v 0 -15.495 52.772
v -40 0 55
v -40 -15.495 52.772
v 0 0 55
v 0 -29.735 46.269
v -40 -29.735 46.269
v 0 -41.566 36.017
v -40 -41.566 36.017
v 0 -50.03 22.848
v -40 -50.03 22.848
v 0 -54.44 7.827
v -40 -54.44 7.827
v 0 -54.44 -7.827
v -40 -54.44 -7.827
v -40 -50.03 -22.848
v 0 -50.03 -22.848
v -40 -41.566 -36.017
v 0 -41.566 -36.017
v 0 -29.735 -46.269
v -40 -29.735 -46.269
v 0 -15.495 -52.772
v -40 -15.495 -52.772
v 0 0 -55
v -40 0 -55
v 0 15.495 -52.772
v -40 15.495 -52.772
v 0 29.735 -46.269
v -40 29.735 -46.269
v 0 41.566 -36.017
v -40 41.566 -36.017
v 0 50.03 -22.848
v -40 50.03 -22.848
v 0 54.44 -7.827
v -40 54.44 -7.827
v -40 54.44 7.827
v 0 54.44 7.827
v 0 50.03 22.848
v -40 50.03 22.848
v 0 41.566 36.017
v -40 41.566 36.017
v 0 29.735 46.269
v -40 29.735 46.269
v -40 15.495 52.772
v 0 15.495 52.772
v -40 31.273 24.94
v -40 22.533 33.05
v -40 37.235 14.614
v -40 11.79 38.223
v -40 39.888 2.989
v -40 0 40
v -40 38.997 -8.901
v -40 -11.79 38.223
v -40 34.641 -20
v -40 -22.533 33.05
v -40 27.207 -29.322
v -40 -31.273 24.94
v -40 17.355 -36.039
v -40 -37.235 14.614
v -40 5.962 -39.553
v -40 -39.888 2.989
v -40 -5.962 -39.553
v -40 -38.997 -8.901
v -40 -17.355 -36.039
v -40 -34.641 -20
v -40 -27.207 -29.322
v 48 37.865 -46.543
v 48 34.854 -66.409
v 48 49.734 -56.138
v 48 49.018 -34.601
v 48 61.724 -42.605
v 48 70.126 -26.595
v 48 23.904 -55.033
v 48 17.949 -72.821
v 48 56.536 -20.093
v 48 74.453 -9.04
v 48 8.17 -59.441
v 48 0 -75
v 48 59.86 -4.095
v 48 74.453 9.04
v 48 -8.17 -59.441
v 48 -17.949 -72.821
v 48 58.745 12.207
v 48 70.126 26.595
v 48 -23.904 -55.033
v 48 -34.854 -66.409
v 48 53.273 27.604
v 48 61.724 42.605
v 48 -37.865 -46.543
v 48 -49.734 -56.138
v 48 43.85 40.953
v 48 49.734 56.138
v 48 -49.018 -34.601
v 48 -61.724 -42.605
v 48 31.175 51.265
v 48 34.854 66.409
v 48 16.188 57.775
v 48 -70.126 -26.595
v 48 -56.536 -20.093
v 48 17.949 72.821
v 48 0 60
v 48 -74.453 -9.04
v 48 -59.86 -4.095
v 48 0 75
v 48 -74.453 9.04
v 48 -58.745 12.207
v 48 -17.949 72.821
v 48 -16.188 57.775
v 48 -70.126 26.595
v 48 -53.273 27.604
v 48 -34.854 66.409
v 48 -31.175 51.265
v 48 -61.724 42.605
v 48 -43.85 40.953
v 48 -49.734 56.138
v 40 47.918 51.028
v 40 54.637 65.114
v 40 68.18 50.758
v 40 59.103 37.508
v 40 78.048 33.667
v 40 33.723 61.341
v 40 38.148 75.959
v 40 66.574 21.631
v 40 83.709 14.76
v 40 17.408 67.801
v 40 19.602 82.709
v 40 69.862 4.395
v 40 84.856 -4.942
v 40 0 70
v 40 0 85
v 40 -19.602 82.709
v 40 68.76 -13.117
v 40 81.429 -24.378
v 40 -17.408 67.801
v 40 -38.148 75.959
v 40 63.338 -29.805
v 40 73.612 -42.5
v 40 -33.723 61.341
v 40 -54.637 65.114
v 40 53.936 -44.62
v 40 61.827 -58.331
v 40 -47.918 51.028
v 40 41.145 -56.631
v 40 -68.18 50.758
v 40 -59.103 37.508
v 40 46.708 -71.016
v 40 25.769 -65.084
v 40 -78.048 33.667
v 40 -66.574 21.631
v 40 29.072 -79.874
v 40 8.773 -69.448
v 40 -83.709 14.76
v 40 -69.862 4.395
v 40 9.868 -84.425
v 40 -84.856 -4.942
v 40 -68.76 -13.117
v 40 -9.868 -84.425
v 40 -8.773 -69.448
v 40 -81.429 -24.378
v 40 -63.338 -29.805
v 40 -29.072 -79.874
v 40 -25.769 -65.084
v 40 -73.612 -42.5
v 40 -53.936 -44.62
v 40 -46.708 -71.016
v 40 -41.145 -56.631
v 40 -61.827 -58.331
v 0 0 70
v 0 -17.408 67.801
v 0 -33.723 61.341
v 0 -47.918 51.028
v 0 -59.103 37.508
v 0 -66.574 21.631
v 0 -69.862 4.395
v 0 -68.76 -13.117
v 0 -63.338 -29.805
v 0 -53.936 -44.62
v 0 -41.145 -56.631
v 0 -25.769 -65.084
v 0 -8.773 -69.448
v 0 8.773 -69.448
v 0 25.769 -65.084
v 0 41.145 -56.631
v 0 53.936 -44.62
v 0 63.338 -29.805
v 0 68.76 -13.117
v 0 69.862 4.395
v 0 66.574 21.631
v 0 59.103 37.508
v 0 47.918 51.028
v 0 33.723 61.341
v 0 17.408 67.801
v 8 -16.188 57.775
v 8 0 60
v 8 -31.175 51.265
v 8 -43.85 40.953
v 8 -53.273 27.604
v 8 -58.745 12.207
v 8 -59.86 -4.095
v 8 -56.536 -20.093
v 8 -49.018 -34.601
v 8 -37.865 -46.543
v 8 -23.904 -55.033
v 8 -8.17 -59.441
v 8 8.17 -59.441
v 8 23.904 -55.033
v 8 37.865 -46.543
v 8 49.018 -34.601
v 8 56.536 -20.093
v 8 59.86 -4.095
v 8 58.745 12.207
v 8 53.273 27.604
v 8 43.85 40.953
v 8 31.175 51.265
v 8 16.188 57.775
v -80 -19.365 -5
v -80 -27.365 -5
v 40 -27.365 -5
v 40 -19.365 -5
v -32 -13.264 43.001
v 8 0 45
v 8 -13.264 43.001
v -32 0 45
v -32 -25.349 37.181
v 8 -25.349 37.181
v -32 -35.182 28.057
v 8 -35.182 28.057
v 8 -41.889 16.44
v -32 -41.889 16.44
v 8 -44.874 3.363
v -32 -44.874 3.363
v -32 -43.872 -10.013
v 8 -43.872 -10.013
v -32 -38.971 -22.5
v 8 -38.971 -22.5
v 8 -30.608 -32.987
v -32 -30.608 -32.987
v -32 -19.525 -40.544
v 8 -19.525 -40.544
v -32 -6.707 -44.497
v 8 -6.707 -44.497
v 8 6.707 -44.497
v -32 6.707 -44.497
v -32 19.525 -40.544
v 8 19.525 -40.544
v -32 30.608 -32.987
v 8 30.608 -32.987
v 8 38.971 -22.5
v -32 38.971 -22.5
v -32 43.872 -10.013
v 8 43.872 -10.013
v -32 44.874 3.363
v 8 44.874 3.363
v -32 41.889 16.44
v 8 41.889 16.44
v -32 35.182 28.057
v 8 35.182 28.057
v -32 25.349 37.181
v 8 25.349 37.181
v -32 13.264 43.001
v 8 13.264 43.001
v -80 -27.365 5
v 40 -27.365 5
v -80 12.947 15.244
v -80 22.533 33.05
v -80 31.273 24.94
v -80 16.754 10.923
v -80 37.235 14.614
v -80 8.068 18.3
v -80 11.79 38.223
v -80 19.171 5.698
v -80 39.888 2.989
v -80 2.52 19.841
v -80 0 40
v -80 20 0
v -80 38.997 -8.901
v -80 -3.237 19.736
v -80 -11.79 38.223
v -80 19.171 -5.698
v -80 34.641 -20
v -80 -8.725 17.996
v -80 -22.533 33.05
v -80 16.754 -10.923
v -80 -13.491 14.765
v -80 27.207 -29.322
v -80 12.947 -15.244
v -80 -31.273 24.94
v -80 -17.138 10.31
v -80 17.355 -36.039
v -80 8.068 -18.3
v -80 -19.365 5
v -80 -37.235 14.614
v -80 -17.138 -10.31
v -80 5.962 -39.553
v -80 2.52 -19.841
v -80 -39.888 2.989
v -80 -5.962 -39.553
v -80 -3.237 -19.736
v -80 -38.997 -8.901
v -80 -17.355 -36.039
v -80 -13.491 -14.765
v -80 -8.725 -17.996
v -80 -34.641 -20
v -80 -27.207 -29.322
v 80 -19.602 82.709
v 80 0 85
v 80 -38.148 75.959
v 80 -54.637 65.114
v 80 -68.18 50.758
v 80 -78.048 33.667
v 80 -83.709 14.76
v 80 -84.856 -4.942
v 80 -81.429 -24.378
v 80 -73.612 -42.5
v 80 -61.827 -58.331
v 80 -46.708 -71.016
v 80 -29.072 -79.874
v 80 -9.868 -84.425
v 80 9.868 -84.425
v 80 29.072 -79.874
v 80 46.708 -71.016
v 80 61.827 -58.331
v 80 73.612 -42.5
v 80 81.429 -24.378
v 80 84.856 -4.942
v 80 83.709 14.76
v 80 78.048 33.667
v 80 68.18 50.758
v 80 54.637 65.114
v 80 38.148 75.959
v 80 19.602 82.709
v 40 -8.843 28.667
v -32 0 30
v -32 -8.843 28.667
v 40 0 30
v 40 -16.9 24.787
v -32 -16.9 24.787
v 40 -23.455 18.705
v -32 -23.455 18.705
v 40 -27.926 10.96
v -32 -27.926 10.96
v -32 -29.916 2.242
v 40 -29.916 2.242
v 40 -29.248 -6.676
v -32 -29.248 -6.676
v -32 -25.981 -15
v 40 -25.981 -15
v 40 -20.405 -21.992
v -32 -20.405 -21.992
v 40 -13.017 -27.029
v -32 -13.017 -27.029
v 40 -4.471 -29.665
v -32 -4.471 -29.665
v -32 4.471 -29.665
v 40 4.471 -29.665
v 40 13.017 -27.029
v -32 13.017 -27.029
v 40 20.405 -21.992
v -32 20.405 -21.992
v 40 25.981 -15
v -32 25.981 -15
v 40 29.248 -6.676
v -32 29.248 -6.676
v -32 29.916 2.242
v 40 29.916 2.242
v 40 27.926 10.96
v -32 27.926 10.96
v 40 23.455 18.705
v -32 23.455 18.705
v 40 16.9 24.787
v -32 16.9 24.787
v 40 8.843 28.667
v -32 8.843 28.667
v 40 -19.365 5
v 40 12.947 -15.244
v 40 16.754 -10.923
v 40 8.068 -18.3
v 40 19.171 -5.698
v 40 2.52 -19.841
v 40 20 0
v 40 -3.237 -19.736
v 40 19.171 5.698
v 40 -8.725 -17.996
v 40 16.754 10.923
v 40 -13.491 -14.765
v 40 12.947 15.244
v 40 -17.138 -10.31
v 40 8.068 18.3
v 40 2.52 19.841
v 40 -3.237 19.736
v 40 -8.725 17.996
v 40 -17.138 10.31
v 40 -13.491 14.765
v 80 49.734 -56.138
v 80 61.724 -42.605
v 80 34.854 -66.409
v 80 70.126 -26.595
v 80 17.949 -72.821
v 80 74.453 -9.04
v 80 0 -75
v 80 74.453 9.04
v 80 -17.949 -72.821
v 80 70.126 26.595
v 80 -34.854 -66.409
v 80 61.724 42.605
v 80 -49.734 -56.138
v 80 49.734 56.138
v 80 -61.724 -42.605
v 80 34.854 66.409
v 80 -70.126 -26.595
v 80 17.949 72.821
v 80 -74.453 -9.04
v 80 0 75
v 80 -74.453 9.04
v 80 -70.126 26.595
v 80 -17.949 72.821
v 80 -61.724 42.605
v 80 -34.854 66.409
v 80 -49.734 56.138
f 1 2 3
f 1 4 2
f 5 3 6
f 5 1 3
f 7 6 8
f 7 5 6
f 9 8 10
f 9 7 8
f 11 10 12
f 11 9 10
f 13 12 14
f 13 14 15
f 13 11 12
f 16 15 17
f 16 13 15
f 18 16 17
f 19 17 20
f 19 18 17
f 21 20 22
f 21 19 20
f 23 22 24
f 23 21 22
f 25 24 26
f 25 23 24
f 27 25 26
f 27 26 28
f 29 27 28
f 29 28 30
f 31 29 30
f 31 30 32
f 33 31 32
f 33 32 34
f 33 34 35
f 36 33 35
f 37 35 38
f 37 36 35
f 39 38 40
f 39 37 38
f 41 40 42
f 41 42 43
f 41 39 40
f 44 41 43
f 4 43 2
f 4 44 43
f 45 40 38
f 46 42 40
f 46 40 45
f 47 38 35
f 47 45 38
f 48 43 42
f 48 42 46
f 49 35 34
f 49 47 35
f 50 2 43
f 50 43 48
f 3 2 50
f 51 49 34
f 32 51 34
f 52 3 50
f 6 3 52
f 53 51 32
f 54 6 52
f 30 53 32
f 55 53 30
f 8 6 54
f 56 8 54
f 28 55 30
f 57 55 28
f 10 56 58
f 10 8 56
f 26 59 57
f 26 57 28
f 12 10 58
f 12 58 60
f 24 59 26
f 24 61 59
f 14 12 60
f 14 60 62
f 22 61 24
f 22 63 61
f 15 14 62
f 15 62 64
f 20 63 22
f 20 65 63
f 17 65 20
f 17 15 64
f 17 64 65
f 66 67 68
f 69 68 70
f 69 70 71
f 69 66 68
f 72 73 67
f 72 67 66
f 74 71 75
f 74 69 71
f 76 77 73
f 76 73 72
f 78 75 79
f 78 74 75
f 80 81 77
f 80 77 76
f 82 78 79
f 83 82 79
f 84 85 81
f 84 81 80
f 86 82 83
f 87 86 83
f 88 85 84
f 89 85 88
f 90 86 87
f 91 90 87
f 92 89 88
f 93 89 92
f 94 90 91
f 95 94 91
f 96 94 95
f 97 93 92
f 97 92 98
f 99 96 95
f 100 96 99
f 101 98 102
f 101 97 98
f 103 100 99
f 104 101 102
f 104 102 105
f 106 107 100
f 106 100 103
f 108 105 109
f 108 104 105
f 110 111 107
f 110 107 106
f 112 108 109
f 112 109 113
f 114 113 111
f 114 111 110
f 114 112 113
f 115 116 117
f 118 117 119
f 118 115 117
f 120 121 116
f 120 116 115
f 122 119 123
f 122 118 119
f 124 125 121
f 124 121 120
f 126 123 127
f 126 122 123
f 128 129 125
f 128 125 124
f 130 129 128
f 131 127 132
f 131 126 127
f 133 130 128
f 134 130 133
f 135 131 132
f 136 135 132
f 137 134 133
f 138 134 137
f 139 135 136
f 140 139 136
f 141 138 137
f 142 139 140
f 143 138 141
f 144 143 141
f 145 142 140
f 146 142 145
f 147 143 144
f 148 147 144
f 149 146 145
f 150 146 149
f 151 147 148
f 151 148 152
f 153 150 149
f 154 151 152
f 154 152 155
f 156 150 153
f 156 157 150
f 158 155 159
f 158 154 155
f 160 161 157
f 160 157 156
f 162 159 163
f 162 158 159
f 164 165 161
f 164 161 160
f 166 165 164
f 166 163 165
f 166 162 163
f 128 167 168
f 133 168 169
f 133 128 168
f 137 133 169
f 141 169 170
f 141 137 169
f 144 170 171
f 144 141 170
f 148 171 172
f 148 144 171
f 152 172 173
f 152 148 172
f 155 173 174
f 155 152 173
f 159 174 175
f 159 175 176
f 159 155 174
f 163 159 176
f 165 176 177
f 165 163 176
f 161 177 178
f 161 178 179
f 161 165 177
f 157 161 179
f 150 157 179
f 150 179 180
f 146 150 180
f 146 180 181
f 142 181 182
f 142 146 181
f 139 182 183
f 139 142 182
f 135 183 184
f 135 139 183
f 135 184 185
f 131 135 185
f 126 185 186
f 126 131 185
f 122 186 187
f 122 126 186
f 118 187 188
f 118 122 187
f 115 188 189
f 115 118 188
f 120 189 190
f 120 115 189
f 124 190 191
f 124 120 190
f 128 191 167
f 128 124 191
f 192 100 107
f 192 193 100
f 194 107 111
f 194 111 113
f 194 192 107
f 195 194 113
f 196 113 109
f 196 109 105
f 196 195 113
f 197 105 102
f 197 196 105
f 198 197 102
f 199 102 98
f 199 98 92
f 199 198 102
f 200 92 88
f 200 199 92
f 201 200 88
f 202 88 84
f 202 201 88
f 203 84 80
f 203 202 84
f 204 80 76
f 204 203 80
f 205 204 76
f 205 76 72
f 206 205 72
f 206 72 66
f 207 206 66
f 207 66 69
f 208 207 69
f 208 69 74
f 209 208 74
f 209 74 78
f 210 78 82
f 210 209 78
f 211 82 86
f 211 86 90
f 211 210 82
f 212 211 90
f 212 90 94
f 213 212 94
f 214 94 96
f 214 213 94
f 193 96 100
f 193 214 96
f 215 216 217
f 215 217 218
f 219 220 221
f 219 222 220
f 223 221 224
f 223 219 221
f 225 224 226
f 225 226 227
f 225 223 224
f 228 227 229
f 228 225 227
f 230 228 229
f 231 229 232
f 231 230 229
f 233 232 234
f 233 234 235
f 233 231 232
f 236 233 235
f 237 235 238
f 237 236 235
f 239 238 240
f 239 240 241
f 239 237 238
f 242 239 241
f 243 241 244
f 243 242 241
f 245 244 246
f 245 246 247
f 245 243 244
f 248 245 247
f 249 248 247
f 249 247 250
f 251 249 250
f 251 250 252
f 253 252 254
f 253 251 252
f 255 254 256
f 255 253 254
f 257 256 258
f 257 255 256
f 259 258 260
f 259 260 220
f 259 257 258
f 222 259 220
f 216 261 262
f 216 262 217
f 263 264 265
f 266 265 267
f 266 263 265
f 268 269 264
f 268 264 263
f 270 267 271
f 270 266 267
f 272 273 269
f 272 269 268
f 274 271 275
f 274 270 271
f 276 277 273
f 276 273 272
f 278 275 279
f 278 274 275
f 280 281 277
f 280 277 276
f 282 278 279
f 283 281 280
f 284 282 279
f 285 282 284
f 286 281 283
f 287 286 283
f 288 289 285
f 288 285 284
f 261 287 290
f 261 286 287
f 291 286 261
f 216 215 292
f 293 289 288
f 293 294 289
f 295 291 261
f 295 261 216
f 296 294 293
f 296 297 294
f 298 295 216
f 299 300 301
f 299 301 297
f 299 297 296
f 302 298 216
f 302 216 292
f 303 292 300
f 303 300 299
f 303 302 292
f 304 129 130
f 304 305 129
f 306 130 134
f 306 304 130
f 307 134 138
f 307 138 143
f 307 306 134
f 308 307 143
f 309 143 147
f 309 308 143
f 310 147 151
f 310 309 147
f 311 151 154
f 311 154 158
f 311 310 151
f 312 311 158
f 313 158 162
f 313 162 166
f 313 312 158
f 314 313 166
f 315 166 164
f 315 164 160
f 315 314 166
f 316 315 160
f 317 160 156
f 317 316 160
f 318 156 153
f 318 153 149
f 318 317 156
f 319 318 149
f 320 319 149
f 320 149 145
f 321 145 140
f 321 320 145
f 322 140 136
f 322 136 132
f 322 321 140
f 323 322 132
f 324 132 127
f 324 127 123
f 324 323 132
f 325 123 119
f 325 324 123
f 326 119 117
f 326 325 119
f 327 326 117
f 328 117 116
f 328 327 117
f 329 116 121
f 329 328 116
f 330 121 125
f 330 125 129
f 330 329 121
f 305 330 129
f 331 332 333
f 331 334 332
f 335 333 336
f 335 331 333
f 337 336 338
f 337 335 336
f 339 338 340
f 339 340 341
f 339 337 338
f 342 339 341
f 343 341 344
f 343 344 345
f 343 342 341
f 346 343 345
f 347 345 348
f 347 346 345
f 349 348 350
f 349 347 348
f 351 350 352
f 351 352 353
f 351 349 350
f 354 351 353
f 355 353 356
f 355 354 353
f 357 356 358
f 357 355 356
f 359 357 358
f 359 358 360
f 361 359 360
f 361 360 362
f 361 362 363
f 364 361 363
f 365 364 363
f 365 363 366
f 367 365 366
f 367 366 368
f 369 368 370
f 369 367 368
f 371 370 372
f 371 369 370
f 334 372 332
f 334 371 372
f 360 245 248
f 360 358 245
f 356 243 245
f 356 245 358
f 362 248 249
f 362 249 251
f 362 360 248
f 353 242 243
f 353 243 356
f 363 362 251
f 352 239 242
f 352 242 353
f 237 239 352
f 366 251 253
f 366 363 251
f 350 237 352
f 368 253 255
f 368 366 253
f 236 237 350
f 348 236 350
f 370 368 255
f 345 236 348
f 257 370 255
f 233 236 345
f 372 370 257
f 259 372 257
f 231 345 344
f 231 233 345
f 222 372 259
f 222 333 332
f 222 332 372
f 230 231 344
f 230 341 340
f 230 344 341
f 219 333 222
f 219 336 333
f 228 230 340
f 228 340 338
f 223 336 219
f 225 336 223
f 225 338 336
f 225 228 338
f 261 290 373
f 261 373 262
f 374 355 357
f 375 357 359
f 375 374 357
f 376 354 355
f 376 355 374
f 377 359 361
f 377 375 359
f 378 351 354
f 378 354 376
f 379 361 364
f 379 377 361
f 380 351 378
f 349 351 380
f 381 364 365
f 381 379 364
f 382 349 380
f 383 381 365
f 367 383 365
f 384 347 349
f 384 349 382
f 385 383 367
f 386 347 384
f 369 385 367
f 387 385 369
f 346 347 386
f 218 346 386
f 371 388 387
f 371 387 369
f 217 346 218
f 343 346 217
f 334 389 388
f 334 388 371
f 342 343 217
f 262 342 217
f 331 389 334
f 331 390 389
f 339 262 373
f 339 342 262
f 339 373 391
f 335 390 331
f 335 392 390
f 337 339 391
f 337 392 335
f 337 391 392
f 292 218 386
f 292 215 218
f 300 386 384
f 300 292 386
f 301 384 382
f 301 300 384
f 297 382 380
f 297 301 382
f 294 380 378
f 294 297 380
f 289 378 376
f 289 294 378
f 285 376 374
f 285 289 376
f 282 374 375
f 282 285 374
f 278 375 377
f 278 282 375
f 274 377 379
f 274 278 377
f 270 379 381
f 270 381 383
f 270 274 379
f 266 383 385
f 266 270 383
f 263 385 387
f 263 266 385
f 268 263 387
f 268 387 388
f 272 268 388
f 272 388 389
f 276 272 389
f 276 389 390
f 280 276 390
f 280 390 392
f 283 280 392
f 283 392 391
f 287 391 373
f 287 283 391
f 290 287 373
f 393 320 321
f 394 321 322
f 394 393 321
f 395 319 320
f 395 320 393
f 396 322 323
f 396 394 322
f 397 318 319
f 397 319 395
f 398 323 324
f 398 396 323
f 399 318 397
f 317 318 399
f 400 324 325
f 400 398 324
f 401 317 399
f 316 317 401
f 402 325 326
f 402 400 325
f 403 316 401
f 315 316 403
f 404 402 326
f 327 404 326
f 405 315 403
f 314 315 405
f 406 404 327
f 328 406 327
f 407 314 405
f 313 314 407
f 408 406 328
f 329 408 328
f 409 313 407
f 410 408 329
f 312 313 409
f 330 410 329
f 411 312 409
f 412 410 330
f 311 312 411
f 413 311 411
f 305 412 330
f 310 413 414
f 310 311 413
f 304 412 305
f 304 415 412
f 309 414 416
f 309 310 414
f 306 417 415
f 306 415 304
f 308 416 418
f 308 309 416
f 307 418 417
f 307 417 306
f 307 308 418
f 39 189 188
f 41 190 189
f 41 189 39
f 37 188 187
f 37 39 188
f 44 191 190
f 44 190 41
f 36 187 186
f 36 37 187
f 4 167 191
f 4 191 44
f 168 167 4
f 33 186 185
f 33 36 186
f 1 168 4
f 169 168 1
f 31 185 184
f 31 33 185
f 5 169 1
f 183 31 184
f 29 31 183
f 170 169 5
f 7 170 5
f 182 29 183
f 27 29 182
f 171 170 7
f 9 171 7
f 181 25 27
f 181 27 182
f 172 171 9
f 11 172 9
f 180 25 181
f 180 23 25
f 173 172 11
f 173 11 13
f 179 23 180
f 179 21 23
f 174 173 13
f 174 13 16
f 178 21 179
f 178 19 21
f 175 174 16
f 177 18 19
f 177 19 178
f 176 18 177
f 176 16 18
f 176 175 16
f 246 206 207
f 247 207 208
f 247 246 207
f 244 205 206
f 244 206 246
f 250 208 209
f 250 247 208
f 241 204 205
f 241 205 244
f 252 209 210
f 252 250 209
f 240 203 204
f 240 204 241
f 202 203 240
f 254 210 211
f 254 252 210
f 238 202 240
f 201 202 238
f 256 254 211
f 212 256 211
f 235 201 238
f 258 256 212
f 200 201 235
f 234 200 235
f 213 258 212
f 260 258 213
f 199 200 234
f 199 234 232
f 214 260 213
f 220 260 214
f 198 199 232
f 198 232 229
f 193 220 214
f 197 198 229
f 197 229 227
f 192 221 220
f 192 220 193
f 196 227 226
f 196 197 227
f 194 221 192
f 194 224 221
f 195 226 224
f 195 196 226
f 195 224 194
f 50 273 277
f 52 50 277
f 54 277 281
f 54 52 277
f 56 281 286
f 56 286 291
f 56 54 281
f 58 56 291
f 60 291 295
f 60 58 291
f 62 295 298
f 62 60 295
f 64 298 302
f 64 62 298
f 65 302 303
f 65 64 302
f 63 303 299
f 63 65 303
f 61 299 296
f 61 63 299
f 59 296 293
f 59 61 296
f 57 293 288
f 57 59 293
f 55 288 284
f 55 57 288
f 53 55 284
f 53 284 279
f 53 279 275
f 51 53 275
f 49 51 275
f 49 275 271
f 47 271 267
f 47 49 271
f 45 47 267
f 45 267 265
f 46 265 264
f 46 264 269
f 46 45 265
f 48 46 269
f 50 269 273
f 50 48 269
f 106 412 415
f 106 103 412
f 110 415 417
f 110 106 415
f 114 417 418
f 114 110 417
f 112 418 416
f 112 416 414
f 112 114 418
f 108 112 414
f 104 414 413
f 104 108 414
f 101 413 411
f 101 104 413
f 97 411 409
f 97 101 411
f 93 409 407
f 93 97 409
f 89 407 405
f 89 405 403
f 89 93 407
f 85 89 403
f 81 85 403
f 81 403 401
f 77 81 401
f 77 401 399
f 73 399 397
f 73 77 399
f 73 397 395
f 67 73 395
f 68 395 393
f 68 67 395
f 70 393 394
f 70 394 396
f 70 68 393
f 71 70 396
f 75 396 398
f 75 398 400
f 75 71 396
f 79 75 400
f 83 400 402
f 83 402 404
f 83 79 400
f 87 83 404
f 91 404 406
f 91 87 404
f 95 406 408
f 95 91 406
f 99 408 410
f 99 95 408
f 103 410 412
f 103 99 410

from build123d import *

# Parameters (mm, degrees)
SKETCH2_R          = 20
CUT_EXTRUDE1_DEPTH = 201.124960962


with BuildPart() as part:
    # Sketch1 → Revolve1 (revolve)
    with BuildSketch(Plane.XY, mode=Mode.PRIVATE) as revolve1_sk:
        Polygon((-80, 20), (-80, 40), (-40, 40), (-40, 55), (0, 55), (0, 70), (40, 70), (40, 85), (80, 85), (80, 75), (48, 75), (48, 60), (8, 60), (8, 45), (-32, 45), (-32, 30), (40, 30), (40, 20), align=None)
    revolve(revolve1_sk.sketch.rotate(Axis((-79.321922317, 0, 0), (1, 0, 0)), 90), axis=Axis((-79.321922317, 0, 0), (1, 0, 0)))

    # Sketch2 → Cut-Extrude1 (cut, through all)
    with BuildSketch(Plane.ZY.offset(80)):
        Circle(SKETCH2_R)
        with BuildLine():
            Line((5, -19.364916731), (5, -27.364916731))
            Line((5, -27.364916731), (-5, -27.364916731))
            Line((-5, -27.364916731), (-5, -19.364916731))
            ThreePointArc((-5, -19.364916731), (0, -20), (5, -19.364916731))
        make_face()
    extrude(amount=-CUT_EXTRUDE1_DEPTH, mode=Mode.SUBTRACT)


solid = part.part
